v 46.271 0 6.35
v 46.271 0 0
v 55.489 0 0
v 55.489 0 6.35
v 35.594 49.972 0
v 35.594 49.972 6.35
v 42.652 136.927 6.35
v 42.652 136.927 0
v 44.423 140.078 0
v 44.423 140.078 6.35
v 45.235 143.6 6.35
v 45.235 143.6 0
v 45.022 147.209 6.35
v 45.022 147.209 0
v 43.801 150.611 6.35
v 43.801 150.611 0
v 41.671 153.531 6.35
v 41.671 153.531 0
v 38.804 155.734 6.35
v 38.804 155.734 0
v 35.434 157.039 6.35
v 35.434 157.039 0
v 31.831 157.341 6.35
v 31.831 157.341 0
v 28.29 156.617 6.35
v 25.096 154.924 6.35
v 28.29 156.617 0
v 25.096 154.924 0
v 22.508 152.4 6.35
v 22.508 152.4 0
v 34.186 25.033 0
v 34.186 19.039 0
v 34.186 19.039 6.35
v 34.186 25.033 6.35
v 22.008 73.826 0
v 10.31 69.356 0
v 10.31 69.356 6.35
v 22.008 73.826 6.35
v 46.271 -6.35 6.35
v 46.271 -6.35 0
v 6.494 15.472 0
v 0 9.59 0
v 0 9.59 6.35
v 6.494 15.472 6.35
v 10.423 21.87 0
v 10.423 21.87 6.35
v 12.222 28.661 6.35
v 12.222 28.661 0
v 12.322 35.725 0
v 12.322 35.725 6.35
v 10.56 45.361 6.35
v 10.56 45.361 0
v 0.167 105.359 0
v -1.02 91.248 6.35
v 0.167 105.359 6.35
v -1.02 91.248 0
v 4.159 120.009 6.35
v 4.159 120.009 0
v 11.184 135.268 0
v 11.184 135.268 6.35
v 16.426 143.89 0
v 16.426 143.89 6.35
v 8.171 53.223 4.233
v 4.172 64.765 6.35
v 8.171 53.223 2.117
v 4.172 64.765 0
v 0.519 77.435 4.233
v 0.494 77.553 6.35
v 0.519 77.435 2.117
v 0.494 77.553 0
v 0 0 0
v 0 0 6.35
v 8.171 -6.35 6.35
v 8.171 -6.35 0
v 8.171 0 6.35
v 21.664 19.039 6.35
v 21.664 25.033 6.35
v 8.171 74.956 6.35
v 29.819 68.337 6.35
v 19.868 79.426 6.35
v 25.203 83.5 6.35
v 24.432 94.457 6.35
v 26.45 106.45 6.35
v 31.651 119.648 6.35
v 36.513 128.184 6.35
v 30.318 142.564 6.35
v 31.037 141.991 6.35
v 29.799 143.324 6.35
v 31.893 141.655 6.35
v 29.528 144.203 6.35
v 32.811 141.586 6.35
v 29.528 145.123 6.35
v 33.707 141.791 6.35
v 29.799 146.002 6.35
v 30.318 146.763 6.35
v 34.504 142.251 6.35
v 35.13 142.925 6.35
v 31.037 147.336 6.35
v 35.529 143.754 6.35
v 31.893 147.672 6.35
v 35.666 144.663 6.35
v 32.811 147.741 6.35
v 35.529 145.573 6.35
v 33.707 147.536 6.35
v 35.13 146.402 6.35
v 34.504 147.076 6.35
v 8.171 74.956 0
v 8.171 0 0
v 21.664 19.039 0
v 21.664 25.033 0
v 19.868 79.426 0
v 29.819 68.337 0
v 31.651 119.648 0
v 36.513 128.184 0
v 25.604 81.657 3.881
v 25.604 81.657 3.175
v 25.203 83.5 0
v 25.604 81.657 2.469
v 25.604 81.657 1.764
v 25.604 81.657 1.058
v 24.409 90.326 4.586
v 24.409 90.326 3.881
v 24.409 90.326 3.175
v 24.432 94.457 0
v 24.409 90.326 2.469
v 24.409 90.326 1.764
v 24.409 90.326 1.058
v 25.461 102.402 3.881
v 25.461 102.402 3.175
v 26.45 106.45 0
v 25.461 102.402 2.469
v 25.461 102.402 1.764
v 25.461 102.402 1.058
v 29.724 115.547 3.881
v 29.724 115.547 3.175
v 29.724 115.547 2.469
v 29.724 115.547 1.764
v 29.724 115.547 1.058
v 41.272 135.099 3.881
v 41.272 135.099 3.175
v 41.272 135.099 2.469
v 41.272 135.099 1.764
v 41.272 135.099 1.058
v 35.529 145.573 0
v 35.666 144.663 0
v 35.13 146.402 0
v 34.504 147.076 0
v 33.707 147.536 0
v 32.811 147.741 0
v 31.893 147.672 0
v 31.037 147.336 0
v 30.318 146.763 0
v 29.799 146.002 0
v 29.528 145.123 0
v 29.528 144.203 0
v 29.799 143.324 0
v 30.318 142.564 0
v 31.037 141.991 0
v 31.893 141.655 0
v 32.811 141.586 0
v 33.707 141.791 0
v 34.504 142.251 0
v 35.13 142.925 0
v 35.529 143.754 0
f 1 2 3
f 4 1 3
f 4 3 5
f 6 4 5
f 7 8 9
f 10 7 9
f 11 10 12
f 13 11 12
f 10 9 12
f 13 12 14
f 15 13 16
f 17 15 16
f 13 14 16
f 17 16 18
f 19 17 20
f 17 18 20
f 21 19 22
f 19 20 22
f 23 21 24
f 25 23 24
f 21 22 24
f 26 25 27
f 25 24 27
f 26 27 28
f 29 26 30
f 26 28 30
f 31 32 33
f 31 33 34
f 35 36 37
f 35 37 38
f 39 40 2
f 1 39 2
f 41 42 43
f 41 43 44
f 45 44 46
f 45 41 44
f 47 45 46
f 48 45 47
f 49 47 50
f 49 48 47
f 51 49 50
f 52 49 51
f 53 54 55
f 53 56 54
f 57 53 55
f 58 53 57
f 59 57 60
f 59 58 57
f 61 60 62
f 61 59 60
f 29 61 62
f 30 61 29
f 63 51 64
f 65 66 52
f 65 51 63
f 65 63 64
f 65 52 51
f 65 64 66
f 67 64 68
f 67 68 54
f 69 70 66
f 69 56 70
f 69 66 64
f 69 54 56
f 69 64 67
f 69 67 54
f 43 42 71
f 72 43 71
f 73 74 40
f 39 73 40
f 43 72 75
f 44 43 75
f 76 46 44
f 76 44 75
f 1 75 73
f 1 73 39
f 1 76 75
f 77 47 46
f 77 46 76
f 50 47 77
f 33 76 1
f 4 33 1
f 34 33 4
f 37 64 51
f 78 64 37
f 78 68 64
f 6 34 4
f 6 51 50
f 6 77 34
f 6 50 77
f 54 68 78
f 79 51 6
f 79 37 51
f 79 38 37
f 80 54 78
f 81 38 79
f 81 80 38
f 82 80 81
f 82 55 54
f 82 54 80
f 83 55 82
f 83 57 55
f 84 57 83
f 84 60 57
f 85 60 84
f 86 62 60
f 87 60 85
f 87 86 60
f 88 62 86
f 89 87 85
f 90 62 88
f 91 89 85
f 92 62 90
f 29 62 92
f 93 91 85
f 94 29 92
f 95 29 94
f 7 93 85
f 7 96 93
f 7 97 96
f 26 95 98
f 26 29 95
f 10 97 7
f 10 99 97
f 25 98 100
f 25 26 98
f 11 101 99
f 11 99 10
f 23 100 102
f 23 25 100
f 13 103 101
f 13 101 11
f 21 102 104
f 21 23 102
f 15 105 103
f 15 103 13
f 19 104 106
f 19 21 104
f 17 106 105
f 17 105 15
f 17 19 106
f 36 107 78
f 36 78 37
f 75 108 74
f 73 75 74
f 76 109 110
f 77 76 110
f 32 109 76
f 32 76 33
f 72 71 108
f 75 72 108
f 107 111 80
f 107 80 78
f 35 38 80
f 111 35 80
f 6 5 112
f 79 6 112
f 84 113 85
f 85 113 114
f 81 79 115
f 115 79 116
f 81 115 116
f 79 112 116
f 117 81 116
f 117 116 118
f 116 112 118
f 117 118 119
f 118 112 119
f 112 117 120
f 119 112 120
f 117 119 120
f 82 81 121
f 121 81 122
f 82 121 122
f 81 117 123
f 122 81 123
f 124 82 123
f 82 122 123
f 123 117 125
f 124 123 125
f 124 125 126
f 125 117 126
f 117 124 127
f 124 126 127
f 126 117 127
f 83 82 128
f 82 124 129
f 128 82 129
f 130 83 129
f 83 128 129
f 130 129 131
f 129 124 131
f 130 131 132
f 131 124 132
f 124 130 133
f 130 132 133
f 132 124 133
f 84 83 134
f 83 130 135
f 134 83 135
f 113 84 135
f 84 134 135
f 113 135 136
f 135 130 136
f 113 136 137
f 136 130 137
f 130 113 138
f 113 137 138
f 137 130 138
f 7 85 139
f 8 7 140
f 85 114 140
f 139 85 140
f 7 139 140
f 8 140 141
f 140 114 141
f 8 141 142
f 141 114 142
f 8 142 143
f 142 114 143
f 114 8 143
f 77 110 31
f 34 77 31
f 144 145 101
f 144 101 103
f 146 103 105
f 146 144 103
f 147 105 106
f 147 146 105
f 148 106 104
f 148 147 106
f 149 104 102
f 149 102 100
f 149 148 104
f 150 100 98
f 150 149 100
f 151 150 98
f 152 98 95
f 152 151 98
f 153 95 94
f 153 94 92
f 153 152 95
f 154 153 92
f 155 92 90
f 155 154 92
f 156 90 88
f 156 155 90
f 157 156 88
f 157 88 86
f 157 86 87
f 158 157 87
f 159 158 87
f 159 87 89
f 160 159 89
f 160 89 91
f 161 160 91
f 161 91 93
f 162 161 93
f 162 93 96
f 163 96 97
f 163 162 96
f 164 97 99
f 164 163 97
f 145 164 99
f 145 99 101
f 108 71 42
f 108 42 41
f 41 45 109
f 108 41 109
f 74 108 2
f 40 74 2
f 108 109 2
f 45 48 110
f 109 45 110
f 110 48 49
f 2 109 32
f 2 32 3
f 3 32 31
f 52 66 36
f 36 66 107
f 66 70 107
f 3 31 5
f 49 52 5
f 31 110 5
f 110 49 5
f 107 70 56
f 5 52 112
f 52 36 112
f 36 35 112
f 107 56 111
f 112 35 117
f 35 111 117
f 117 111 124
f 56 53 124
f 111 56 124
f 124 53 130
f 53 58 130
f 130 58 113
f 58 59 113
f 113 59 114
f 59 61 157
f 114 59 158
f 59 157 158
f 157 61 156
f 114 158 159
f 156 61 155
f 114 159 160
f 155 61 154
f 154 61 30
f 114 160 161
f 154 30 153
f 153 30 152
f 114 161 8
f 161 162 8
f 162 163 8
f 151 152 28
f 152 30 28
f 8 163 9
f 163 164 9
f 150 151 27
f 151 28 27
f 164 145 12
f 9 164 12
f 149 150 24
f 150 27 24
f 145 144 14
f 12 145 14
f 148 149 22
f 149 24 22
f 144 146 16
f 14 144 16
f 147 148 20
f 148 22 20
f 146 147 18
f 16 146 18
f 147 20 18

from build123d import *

# Parameters (mm, degrees)
SKETCH1_R           = 3.0861
SKETCH1_W           = 12.5222
SKETCH1_H           = 5.9944
BOSS_EXTRUDE1_DEPTH = 6.35


with BuildPart() as part:
    # Sketch1 → Boss-Extrude1 (new body)
    with BuildSketch(Plane.XY):
        with BuildLine():
            Line((0, 0), (8.17063217, 0))
            Line((8.17063217, 0), (8.17063217, -6.35))
            Line((8.17063217, -6.35), (46.27063217, -6.35))
            Line((46.27063217, -6.35), (46.27063217, 0))
            Line((46.27063217, 0), (55.488574343, 0))
            Line((55.488574343, 0), (35.593928158, 49.97151257))
            add(Edge.make_bspline(
                [(35.593928158, 49.97151257), (35.340737153, 51.011091182), (34.289692424, 55.03884072), (31.957417171, 62.348344314), (29.449052089, 69.339178116), (27.57881277, 74.801296199), (26.423935243, 78.479850782), (25.55485091, 81.728738299), (24.788233703, 85.483659955), (24.284352637, 90.308612383), (24.428183006, 96.20335615), (25.327585112, 102.354497696), (27.029689584, 108.787993917), (29.577624998, 115.505437797), (32.431224266, 121.309144006), (35.158066015, 126.048842881), (37.424080544, 129.643418636), (39.497556945, 132.668231109), (41.261681964, 135.095684908), (42.186501173, 136.321547482), (42.651516027, 136.926910036)],
                knots=[0.250437186, 0.250437186, 0.250437186, 0.250437186, 0.266062186, 0.3125, 0.375, 0.40625, 0.4375, 0.46875, 0.5, 0.5625, 0.625, 0.6875, 0.75, 0.8125, 0.875, 0.90625, 0.9375, 0.96875, 0.984375, 1, 1, 1, 1], degree=3))
            ThreePointArc((42.651516027, 136.926910036), (40.316523303, 154.734992723), (22.508440616, 152.4))
            add(Edge.make_bspline(
                [(0, 9.589675689), (16.950704725, 21.543735705), (11.362052202, 46.597336486), (-7.636318626, 94.064001484), (3.941433469, 128.229221831), (22.508440616, 152.4)],
                knots=[0, 0, 0, 0, 0.312818519, 0.480279904, 1, 1, 1, 1], degree=3))
            Line((0, 9.589675689), (0, 0))
        make_face()
        with Locations((32.579978321, 144.663455018)):
            Circle(SKETCH1_R, mode=Mode.SUBTRACT)
        Polygon((8.17063217, 74.955854978), (10.310412852, 69.356375539), (22.007630495, 73.826341117), (19.867849812, 79.425820556), align=None, mode=Mode.SUBTRACT)
        with Locations((27.92484424, 22.035916142)):
            Rectangle(SKETCH1_W, SKETCH1_H, mode=Mode.SUBTRACT)
    extrude(amount=BOSS_EXTRUDE1_DEPTH)


solid = part.part
